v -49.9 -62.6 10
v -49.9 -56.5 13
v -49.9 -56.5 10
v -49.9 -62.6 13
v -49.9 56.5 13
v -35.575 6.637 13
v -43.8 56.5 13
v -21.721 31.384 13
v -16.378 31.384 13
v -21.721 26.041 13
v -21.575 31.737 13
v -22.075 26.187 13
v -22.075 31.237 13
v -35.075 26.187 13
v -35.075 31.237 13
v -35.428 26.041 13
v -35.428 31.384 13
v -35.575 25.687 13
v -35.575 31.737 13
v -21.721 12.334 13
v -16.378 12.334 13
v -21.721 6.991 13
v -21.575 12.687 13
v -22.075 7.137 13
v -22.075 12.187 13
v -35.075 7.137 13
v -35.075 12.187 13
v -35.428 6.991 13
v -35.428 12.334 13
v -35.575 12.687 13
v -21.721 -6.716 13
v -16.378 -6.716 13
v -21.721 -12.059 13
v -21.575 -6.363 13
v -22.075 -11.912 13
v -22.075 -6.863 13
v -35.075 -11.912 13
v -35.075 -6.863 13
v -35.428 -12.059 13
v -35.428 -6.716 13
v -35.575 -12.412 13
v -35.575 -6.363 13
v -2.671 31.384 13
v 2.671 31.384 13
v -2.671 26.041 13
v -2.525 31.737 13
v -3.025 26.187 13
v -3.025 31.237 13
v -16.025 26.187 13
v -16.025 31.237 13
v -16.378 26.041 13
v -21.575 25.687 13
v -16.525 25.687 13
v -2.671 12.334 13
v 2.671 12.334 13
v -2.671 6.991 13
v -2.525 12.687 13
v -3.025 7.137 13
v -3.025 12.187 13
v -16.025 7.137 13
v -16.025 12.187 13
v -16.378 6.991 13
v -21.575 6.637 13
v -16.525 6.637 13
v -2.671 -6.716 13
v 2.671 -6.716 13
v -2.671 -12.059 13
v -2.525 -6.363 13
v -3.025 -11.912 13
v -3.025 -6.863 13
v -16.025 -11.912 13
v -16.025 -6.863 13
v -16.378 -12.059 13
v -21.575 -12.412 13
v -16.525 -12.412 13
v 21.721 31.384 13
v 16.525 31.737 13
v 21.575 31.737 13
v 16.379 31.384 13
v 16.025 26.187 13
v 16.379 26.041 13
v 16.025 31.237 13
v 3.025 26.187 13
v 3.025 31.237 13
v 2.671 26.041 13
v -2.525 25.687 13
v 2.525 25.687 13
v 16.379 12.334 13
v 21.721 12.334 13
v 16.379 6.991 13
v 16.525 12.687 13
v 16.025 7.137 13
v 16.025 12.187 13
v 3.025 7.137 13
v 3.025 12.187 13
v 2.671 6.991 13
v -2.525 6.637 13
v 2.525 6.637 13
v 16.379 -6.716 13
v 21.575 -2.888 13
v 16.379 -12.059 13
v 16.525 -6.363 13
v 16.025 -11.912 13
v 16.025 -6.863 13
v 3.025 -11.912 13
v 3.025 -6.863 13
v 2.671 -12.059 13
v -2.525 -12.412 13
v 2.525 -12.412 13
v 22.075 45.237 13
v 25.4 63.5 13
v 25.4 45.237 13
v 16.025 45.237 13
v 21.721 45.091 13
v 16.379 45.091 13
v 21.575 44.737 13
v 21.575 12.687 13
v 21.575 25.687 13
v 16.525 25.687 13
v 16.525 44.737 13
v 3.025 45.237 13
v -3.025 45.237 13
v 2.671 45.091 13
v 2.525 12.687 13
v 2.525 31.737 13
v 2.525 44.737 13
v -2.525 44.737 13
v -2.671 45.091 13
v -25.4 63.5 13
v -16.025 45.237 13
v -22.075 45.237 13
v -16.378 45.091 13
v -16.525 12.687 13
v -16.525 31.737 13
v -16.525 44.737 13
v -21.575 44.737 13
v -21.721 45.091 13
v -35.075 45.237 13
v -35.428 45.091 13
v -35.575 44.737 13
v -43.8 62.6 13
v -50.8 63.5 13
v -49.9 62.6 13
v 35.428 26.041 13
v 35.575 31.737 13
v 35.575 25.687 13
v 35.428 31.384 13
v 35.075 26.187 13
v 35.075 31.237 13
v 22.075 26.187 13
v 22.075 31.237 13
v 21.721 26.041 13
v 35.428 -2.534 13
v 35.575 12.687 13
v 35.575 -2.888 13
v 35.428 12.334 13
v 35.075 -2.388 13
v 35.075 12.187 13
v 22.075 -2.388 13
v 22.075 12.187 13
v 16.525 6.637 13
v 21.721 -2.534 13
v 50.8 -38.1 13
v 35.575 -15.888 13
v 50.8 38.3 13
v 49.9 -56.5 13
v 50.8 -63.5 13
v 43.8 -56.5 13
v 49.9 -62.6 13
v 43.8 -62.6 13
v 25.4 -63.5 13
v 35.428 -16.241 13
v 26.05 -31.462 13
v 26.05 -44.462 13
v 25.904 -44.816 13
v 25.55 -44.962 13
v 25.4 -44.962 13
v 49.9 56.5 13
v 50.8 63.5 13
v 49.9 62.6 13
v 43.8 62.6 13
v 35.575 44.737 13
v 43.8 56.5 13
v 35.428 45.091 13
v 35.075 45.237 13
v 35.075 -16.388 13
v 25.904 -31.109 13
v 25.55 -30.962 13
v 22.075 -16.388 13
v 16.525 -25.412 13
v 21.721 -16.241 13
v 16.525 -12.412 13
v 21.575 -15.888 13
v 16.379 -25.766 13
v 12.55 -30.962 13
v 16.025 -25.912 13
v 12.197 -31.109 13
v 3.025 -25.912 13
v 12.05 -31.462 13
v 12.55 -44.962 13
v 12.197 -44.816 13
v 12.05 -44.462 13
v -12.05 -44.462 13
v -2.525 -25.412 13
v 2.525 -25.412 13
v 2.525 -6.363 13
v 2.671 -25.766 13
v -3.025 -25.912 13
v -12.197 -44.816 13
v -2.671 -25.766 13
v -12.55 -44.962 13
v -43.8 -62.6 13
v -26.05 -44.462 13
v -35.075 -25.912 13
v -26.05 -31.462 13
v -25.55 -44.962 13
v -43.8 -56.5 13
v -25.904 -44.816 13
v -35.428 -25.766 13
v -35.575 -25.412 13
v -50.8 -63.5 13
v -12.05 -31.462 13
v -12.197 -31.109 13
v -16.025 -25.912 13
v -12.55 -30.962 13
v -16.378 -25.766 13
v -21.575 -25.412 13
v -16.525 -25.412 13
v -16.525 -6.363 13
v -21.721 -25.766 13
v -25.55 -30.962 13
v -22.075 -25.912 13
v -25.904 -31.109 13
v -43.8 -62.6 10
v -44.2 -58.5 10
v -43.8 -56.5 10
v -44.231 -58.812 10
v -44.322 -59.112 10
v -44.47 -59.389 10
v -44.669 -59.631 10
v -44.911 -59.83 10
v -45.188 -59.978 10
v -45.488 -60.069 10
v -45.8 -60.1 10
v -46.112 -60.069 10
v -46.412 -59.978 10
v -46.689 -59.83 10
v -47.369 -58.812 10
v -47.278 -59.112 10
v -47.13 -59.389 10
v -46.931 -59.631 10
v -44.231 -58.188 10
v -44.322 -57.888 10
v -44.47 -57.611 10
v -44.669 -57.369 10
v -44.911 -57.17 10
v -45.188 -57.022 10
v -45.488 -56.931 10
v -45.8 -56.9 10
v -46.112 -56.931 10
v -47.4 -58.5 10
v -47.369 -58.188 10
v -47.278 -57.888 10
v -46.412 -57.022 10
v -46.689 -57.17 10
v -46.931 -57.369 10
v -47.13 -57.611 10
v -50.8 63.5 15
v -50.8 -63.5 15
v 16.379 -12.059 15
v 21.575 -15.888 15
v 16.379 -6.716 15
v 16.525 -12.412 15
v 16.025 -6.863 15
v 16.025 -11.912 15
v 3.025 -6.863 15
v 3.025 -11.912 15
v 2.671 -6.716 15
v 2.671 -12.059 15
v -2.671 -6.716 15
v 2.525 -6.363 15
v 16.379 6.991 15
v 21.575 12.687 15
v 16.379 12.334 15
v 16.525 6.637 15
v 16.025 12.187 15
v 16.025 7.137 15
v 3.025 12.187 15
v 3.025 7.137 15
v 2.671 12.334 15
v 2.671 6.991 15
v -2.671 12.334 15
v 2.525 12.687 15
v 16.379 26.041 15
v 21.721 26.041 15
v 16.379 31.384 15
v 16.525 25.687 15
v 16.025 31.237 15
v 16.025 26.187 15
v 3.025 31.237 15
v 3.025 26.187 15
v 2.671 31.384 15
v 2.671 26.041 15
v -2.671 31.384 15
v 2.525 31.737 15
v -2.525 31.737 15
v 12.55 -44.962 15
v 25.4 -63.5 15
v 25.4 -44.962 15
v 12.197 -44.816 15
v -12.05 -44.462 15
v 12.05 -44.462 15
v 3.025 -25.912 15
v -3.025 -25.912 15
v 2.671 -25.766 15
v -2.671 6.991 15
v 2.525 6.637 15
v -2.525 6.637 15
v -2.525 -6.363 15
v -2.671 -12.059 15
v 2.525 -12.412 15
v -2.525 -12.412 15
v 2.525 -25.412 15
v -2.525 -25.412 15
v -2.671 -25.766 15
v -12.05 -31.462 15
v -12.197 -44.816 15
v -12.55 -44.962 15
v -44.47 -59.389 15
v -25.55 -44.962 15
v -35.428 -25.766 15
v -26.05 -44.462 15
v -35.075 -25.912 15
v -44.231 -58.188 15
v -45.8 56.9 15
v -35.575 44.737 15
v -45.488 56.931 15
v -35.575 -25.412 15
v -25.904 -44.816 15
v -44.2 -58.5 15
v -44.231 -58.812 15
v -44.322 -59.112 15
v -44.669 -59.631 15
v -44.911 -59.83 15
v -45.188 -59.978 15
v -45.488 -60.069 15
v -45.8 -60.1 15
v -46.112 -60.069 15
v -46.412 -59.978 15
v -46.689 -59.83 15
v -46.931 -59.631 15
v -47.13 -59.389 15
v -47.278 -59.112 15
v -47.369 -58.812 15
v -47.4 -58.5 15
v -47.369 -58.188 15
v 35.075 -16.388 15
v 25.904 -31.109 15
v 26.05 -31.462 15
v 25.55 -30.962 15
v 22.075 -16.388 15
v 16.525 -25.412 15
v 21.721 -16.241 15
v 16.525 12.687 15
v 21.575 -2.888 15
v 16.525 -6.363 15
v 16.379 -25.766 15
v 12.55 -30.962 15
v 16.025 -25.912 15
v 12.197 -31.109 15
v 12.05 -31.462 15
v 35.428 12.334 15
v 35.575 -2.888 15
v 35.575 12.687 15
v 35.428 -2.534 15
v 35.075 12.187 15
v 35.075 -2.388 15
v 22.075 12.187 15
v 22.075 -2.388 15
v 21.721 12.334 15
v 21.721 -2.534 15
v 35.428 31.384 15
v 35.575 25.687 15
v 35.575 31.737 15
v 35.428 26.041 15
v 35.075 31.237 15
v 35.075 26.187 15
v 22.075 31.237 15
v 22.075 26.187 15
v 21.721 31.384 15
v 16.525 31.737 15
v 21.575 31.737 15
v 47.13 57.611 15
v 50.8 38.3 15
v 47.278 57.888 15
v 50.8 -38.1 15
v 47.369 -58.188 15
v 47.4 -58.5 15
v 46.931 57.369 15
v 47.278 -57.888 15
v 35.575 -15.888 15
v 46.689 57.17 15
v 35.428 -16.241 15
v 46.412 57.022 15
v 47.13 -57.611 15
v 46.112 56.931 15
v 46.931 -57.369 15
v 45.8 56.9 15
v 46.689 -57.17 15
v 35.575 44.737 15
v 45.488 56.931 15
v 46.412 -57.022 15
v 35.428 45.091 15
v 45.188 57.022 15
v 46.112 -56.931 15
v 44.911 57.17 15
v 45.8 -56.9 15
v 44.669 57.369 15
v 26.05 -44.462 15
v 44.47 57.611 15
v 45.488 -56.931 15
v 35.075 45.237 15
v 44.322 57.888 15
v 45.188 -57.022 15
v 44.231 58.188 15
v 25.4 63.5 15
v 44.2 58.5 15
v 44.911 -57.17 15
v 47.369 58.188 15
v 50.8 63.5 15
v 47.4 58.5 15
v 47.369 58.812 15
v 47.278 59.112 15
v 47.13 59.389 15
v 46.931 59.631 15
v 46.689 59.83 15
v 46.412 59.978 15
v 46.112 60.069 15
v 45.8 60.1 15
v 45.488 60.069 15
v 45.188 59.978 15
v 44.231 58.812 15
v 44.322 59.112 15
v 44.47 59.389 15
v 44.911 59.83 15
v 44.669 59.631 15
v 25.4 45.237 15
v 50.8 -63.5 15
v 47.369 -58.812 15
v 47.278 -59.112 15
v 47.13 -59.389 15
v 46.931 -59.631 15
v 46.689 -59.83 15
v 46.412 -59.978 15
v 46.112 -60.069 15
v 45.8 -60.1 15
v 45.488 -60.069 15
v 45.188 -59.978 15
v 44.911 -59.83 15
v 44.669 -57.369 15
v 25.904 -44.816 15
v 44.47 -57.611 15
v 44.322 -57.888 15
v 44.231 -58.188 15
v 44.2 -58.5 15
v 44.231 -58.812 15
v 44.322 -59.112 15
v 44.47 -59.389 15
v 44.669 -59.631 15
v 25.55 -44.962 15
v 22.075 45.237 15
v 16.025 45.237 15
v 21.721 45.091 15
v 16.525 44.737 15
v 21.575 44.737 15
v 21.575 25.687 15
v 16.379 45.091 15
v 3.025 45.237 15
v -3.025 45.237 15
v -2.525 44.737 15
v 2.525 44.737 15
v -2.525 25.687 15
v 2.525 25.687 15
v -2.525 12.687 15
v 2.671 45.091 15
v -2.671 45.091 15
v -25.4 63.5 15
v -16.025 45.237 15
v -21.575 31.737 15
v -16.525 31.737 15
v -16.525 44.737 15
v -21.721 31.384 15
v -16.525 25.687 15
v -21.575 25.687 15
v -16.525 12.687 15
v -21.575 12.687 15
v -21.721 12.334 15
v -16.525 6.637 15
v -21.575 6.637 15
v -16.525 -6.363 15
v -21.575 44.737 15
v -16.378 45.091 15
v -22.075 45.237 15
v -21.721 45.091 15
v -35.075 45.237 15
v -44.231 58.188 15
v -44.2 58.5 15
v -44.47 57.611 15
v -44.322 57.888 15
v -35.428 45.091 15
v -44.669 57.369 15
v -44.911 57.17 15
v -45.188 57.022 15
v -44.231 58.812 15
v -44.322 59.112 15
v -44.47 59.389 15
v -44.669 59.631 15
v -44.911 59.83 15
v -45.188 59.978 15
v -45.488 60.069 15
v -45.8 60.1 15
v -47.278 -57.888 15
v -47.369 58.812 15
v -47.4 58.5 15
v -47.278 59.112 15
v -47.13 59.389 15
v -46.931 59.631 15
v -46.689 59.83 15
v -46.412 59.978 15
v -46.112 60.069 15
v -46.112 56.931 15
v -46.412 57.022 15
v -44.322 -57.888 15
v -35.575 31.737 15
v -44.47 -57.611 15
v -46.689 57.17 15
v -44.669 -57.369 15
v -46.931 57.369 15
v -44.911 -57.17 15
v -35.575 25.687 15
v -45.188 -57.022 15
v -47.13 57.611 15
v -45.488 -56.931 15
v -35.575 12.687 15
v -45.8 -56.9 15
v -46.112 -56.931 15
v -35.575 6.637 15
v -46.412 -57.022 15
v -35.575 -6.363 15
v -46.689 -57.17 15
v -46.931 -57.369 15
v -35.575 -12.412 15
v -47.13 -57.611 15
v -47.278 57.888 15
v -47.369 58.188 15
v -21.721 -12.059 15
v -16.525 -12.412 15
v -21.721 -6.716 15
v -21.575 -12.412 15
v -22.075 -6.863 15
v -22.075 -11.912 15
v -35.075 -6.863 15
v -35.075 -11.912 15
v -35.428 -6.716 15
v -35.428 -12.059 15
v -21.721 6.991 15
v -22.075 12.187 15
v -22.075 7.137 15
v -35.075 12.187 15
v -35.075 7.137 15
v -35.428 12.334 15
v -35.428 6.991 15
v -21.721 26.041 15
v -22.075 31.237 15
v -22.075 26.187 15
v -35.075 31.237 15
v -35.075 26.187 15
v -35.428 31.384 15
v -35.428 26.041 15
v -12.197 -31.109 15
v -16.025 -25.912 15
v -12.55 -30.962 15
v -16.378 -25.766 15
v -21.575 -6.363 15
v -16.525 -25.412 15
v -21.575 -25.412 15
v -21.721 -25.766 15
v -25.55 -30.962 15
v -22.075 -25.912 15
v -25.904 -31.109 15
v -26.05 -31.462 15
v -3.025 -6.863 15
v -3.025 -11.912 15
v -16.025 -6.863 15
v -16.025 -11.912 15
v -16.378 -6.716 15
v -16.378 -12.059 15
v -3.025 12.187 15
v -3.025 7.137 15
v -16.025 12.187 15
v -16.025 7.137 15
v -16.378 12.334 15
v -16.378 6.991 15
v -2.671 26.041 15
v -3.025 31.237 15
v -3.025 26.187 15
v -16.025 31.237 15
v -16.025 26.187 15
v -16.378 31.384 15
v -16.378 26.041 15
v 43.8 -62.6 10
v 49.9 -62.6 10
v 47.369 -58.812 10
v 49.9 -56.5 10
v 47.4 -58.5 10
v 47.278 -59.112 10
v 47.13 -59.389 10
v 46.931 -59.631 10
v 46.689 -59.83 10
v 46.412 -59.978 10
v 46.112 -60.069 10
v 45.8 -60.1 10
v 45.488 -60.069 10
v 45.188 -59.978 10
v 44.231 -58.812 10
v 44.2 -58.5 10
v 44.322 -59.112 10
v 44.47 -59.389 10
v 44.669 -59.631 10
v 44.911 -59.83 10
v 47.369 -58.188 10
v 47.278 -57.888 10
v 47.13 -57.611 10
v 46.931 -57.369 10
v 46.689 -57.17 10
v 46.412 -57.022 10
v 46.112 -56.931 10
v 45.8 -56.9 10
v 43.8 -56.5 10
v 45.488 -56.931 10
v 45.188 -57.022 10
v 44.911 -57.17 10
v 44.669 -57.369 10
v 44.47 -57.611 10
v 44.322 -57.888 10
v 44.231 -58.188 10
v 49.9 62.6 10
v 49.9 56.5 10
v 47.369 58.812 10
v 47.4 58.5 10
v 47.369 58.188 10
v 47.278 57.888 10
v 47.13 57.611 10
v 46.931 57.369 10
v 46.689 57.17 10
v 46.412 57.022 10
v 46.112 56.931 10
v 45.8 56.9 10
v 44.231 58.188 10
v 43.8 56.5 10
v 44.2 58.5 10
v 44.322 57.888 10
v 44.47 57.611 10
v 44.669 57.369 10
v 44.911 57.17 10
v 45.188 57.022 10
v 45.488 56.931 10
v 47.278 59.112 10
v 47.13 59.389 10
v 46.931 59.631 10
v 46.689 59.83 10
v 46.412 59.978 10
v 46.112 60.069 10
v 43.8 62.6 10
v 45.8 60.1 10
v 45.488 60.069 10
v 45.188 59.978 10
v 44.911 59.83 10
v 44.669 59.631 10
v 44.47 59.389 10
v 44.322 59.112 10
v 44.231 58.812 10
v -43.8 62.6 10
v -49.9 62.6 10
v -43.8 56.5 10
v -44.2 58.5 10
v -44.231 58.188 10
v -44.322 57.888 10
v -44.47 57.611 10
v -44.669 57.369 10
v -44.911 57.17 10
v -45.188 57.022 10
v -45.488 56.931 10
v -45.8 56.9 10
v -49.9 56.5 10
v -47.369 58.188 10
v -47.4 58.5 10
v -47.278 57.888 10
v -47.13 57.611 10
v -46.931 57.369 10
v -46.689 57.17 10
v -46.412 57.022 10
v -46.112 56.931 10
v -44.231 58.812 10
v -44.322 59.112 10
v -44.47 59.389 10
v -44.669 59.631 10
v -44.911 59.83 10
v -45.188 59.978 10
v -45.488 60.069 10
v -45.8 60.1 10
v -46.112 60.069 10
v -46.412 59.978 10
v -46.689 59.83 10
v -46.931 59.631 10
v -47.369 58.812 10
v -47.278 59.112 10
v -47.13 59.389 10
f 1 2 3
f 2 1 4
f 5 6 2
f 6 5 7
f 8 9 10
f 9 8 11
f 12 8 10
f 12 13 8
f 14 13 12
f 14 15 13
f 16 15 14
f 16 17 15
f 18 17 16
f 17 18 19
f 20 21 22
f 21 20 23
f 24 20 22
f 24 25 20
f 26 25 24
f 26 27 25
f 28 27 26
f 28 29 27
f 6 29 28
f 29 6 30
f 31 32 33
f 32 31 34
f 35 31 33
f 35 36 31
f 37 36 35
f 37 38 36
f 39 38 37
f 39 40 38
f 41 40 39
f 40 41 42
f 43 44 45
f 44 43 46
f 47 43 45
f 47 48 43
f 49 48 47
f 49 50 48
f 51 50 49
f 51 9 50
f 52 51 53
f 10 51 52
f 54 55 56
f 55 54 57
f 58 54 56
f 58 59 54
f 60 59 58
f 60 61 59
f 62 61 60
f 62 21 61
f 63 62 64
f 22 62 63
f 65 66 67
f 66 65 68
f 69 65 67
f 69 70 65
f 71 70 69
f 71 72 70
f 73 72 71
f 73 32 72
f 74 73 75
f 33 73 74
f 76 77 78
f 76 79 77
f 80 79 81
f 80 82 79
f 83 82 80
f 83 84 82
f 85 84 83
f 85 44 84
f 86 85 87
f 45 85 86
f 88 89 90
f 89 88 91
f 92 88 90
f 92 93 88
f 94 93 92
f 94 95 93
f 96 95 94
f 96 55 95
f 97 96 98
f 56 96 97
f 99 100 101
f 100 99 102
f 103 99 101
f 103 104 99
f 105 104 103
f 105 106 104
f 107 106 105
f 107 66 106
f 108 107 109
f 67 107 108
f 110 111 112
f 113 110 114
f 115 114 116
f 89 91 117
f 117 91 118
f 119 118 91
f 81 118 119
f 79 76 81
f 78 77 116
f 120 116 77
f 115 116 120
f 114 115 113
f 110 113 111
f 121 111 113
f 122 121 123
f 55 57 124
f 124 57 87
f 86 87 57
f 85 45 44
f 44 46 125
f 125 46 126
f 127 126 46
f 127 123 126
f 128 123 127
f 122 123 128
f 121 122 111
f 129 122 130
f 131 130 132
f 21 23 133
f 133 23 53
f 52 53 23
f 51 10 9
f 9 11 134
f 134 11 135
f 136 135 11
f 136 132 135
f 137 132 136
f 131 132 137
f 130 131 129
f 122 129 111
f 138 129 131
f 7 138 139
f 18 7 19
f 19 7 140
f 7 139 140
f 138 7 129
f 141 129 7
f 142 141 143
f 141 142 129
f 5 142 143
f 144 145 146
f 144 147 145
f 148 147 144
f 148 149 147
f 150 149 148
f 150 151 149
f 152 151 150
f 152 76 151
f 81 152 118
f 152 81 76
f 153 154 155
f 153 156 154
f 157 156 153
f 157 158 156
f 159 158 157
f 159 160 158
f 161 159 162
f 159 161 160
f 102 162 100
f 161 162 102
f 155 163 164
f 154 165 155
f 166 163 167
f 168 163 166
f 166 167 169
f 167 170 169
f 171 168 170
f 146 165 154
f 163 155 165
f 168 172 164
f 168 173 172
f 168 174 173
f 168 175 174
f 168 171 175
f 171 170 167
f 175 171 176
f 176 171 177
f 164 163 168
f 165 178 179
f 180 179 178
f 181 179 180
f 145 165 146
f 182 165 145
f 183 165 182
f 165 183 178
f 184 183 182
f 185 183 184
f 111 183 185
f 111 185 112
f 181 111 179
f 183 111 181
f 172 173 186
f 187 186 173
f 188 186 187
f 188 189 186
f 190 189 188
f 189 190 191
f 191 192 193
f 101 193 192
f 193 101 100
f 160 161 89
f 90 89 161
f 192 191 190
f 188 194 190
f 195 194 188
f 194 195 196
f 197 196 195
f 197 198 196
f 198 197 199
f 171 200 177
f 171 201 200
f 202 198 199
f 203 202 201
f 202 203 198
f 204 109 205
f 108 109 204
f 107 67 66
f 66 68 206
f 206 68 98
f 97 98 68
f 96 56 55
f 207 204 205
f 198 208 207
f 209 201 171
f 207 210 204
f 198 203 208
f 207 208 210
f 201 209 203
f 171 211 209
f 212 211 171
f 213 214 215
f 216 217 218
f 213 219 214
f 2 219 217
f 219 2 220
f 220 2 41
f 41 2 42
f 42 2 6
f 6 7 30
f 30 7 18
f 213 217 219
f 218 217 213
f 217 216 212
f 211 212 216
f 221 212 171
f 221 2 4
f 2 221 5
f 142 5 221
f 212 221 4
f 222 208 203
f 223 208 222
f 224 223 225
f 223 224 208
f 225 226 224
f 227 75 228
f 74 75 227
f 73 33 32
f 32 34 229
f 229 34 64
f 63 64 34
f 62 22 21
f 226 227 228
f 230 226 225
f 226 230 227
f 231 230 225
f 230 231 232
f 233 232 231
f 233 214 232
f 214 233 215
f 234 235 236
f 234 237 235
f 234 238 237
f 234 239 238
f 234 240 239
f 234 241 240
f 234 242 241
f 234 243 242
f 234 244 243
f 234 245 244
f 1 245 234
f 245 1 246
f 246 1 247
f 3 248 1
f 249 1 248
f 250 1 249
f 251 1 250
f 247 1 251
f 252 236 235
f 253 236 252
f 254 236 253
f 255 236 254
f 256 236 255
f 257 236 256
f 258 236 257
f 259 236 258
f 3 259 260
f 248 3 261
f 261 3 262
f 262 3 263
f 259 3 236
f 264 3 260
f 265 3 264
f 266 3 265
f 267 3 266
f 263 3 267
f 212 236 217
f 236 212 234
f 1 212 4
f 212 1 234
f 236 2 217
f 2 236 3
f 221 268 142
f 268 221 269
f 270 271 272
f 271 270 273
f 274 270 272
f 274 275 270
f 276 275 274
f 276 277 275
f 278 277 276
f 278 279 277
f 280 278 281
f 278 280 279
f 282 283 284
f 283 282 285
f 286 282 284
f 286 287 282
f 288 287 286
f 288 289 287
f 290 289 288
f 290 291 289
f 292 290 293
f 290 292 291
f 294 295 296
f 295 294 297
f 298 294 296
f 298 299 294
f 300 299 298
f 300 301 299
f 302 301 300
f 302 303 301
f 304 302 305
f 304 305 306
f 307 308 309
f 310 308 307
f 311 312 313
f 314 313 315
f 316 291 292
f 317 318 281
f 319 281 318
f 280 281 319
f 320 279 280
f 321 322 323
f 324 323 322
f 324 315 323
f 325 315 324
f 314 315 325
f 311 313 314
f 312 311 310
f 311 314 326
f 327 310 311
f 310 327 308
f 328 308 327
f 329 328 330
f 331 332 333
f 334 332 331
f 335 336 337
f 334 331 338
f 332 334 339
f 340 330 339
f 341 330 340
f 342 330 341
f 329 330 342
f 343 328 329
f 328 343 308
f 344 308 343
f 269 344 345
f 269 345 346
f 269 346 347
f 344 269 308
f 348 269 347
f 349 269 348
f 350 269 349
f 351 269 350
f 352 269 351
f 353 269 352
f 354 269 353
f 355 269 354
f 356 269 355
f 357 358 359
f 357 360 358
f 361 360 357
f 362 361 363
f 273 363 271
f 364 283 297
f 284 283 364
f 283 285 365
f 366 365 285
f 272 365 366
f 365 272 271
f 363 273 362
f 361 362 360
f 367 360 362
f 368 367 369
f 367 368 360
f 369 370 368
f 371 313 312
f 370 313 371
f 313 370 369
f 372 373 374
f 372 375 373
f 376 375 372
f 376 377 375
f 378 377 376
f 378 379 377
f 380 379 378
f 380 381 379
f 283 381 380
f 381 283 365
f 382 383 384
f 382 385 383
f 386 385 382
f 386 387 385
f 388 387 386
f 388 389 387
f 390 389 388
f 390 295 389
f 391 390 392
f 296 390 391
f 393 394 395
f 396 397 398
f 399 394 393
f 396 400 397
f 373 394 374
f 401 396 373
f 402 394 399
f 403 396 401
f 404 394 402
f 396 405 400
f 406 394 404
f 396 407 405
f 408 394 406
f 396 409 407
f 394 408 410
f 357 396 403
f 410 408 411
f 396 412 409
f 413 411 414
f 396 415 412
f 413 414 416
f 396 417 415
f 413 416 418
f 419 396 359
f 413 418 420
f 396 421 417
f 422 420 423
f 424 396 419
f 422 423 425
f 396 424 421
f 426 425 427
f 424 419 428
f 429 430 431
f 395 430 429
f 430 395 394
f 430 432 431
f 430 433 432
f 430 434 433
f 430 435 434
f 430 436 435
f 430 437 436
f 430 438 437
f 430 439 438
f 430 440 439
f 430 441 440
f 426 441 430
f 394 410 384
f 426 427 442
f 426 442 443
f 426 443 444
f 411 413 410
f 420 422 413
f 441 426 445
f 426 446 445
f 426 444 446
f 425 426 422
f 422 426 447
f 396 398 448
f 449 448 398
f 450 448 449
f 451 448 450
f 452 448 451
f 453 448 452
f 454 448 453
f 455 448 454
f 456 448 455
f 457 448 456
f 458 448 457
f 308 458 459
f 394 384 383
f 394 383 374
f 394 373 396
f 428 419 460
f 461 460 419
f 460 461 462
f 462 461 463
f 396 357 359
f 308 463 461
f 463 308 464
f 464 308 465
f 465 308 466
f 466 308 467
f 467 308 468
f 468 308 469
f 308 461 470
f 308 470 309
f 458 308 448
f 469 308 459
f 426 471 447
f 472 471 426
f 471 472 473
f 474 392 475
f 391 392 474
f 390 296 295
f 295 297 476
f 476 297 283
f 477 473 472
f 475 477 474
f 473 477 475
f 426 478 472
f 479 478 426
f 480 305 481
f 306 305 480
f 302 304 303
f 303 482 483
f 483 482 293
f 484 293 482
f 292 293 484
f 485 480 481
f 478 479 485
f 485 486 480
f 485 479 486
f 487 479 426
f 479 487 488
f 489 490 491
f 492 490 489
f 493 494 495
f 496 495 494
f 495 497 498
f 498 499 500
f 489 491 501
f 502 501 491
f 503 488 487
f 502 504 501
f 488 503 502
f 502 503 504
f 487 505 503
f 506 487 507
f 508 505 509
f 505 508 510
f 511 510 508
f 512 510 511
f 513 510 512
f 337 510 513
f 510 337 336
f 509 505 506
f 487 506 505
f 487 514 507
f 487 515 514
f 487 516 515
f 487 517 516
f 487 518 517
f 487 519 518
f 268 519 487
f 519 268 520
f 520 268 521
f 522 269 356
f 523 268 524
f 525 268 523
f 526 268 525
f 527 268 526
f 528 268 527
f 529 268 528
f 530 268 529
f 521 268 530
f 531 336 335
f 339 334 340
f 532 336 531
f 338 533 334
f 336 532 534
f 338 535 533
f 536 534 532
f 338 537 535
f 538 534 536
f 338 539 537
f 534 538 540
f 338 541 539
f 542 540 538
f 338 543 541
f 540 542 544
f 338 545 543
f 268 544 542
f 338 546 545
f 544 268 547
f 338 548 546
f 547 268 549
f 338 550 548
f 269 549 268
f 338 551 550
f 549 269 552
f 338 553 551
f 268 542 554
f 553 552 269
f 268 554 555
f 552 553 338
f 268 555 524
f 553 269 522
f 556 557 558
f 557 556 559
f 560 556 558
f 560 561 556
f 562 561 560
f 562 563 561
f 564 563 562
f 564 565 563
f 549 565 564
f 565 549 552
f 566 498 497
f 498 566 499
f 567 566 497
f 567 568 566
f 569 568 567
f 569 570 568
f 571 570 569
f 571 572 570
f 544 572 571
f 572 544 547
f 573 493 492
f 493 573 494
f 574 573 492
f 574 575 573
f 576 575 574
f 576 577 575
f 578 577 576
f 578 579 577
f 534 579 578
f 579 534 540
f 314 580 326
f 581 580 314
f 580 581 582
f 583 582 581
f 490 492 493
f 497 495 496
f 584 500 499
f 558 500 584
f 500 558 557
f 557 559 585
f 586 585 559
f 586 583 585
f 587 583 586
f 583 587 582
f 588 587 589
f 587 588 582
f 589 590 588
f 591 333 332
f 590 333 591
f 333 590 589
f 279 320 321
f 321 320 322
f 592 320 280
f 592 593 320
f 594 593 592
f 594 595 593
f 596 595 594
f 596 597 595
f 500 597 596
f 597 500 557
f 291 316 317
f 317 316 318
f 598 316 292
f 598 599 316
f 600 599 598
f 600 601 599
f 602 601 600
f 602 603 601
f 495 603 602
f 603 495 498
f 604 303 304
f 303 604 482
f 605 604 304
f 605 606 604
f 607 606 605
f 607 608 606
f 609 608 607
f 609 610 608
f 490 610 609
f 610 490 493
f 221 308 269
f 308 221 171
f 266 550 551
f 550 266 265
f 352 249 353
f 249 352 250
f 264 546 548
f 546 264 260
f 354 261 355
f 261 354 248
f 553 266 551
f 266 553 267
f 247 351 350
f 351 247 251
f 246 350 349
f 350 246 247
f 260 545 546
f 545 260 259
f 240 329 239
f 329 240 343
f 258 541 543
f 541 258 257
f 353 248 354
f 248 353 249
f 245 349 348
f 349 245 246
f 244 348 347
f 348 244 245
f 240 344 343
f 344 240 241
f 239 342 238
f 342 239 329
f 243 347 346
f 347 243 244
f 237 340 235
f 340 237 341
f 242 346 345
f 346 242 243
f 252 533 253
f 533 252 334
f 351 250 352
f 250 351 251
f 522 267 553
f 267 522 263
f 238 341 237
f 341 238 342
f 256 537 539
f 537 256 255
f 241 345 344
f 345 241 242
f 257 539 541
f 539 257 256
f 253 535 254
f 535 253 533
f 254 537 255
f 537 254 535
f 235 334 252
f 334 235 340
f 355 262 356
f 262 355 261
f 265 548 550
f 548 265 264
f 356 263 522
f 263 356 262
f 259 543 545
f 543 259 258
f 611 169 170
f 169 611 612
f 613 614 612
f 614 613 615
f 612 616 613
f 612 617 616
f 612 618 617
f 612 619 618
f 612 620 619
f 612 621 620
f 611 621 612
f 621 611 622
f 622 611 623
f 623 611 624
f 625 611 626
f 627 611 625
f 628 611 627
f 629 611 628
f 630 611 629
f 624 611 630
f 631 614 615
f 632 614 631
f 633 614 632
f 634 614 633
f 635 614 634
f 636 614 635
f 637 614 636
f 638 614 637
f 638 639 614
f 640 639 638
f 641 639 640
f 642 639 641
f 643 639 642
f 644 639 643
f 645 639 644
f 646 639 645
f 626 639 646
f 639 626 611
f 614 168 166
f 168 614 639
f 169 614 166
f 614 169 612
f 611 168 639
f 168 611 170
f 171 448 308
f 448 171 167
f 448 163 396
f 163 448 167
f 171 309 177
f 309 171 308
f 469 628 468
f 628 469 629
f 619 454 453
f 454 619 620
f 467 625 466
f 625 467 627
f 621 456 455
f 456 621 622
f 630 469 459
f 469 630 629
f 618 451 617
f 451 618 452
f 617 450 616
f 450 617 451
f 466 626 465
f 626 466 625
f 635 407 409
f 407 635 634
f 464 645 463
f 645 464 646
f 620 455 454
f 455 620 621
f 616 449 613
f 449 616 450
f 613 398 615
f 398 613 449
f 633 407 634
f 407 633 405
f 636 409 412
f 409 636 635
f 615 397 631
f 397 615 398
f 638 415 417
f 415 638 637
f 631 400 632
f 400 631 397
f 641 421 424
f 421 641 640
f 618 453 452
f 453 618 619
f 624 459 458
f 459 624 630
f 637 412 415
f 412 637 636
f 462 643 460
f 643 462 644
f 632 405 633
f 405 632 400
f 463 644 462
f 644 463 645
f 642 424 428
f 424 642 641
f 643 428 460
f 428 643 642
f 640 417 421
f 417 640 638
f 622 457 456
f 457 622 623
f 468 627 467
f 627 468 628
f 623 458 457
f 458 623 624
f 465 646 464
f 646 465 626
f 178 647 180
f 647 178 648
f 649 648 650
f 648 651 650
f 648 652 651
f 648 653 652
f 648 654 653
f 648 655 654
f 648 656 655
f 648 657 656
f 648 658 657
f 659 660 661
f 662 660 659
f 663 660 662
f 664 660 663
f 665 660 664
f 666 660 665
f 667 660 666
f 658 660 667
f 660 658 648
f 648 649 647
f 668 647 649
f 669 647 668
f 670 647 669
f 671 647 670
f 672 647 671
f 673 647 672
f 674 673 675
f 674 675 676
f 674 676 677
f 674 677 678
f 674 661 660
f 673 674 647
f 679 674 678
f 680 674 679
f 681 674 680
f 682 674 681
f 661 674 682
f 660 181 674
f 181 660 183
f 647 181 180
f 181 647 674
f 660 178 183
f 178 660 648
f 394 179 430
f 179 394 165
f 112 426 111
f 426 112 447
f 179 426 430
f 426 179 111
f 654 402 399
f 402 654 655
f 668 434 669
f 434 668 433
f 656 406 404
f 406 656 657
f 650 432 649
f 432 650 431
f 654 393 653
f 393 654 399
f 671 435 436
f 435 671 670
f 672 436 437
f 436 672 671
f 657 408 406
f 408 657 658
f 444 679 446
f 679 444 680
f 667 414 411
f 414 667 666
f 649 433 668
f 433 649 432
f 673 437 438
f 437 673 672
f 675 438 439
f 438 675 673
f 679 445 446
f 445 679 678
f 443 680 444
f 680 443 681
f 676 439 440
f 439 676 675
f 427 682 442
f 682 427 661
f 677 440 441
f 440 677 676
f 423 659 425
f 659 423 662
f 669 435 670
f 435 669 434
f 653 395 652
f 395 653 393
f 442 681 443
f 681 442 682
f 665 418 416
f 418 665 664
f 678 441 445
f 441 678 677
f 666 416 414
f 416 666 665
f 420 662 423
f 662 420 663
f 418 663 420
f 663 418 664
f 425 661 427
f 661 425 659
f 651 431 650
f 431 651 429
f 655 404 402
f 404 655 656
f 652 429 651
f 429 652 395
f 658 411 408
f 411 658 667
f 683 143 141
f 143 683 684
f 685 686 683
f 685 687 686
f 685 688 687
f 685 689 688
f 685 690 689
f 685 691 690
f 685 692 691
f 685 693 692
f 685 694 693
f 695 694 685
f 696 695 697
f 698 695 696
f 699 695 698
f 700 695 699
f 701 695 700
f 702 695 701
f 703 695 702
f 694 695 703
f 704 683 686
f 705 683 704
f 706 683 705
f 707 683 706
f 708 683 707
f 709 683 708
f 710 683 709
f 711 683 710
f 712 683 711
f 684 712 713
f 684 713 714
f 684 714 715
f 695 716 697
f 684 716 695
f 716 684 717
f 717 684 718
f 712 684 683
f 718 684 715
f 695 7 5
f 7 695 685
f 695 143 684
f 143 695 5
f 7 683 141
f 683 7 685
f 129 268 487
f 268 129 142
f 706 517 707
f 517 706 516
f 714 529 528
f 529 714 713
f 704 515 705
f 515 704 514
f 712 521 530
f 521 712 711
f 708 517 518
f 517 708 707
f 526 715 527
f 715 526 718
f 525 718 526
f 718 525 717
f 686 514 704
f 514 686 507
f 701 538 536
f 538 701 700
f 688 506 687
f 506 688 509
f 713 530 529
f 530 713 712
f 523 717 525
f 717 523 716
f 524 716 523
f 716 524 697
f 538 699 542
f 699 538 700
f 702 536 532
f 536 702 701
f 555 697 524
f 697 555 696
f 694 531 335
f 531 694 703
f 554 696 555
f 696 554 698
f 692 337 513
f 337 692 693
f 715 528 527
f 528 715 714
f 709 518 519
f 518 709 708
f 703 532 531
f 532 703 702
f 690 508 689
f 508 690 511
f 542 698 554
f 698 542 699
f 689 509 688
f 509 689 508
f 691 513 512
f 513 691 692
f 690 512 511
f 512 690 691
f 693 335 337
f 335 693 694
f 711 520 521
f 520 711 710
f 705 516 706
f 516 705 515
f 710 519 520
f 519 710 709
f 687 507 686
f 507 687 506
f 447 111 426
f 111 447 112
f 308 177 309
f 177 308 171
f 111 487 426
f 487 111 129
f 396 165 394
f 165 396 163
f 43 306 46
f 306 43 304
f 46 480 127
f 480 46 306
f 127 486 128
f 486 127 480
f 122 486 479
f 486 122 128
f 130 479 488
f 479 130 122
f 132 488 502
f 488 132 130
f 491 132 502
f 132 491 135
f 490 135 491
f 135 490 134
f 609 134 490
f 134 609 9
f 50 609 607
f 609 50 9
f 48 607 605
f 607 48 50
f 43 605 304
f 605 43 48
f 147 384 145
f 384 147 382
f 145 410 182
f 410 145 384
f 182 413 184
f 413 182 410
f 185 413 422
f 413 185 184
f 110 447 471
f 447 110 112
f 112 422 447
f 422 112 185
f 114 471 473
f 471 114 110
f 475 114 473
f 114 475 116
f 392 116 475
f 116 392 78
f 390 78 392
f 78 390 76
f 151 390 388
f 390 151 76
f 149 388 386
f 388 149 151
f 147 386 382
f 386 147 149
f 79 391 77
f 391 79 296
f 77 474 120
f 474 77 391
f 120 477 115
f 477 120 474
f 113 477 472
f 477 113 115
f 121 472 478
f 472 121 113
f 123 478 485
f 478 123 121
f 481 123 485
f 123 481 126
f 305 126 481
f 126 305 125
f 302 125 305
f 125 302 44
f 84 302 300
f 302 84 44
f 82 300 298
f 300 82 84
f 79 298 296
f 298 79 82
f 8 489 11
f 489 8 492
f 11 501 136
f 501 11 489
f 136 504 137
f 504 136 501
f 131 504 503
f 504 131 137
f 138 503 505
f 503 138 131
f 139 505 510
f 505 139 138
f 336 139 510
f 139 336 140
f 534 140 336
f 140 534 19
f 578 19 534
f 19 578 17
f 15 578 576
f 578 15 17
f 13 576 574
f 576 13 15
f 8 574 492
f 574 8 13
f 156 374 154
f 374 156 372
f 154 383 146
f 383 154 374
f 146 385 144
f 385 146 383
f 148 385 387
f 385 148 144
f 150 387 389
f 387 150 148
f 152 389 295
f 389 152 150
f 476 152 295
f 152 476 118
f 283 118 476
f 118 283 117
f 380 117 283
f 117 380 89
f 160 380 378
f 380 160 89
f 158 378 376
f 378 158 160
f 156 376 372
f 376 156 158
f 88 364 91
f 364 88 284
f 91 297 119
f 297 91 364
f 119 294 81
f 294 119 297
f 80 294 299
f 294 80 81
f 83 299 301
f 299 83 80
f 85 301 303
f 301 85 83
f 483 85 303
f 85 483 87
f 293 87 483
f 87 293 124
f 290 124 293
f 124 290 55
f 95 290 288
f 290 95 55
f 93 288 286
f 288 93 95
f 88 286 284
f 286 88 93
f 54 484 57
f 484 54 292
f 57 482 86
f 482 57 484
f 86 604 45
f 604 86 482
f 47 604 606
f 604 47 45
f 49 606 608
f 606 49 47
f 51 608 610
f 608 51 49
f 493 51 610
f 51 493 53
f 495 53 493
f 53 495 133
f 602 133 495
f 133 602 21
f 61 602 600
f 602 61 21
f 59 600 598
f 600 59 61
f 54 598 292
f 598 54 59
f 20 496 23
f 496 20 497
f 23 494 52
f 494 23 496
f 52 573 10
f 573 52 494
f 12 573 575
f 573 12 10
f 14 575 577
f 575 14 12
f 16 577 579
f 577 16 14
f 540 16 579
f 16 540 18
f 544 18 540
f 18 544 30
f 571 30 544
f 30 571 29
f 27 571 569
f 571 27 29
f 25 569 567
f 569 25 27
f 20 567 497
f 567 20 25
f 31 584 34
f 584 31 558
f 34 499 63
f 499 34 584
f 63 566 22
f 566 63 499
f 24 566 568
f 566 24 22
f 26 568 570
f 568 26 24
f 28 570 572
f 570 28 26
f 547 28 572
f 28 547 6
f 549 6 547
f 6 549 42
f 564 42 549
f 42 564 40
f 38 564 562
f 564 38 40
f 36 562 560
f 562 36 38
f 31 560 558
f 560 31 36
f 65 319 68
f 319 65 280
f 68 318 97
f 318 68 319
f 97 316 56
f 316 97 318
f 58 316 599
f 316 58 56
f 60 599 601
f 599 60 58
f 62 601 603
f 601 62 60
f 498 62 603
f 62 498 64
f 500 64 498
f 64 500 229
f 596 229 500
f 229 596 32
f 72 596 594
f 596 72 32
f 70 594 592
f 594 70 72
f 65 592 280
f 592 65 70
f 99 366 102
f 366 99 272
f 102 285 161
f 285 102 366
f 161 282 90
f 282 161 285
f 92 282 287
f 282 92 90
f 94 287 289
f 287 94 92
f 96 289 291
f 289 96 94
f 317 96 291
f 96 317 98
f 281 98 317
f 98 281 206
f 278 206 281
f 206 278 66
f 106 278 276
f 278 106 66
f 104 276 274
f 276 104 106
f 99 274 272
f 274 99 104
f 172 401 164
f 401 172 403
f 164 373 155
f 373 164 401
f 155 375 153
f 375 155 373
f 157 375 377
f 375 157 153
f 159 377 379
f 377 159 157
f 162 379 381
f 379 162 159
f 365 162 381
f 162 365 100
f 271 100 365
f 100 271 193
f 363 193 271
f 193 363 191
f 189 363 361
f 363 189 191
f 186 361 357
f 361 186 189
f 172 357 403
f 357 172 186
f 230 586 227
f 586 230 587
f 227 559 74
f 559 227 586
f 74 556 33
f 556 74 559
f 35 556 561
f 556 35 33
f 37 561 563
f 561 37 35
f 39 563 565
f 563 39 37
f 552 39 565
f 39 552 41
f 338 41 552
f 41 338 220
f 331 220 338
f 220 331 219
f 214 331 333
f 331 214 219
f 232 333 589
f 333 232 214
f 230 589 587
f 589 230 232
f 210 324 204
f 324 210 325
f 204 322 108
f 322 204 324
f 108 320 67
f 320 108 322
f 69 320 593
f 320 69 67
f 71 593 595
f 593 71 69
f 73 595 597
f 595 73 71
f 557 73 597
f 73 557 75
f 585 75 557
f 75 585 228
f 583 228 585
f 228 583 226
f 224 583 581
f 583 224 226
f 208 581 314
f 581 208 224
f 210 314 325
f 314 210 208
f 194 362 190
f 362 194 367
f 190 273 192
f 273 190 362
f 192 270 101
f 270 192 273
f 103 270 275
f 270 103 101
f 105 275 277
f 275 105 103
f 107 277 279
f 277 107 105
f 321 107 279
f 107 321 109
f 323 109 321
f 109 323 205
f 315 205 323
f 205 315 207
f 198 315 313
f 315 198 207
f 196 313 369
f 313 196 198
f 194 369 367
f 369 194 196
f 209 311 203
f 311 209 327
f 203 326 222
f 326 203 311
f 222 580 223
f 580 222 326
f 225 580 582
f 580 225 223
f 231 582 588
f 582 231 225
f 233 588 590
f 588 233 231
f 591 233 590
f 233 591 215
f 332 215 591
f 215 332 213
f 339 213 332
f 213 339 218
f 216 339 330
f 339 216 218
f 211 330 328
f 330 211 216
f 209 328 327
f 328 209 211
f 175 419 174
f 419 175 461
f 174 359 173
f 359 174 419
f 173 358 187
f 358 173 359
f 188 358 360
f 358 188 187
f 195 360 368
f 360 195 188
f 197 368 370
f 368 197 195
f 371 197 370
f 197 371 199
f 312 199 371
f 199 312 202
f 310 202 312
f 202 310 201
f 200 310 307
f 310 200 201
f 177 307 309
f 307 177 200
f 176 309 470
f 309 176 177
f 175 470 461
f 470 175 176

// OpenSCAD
base = 4;
wall_height = 0.9;







module corner_base(){
    cube([25.4,25.4,base],center = false);
    rotate([0,0,270]){
        translate([0,0,0]){
            mirror([1,0,0]){
                difference(){
        union(){
            
            translate([0,25.4-wall_height,base])
                cube([25.4,0.9,9]);
            translate([0,17.4,base])
                    cube([7.1,7.1,4],center = false);
            
            difference(){
                translate([17.4,17.4,base])
                    cube([7.1,7.1,4],center = false);
                translate([20.4,20.4,base+2.5])
                    cylinder(h = 5, r = 1.6,center = true,$fn = 32  );
            }
        }
        translate([25.4/2 - 11/2,25.4-2,base+4])
            cube([11,5,10]);
        translate([3.6,24.9,base+2]){
            rotate([90,0,0])
            cylinder(h=3,r=1.6,center = true,$fn = 32);
    }
        translate([21.8,24.9,base+2]){
            rotate([90,0,0])
                cylinder(h=3,r=1.6,center = true,$fn = 32);
    }
    }   
                
            }
            
    }      
        
    }

    difference(){
        union(){
            
            translate([0,25.4-wall_height,base])
                cube([25.4,0.9,9]);
            translate([0,17.4,base])
                    cube([7.1,7.1,4],center = false);
            
            difference(){
                translate([17.4,17.4,base])
                    cube([7.1,7.1,4],center = false);
                translate([20.4,20.4,base+2.5])
                    cylinder(h = 5, r = 1.6,center = true,$fn = 32  );
            }
        }
        translate([25.4/2 - 11/2,25.4-2,base+4])
            cube([11,5,10]);
        translate([3.6,24.9,base+2]){
            rotate([90,0,0])
            cylinder(h=3,r=1.6,center = true,$fn = 32);
    }
        translate([21.8,24.9,base+2]){
            rotate([90,0,0])
                cylinder(h=3,r=1.6,center = true,$fn = 32);
    }
    }   
}
















module edge_base(){
    translate([-25.4,0,0]){

        cube([25.4,25.4,base],center = false);
        

        difference(){
            union(){
                
                translate([0,25.4-wall_height,base])
                    cube([25.4,0.9,9]);
                translate([0,17.4,base])
                        cube([7.1,7.1,4],center = false);
                
                difference(){
                    translate([17.4,17.4,base])
                        cube([7.1,7.1,4],center = false);
                    
                }
            }
            translate([25.4/2 - 11/2,25.4-2,base+4])
                cube([11,5,10]);
            translate([3.6,24.9,base+2]){
                rotate([90,0,0])
                cylinder(h=3,r=1.6,center = true,$fn = 32);
        }
            translate([21.8,24.9,base+2]){
                rotate([90,0,0])
                    cylinder(h=3,r=1.6,center = true,$fn = 32);
        }
        }
    }

}








module corner_top(){
    difference(){
        union(){
            translate([18.4,18.4,10]){
                cube([6.1,6.1,3]);
            }
            translate([0,0,9+base]){
                cube([25.4,25.4,2]);
            }
        }
        
        
        translate([20.4,20.4,12.5])
            cylinder(h = 15, r = 1.6,center = true,$fn = 32  );

    }
}
difference(){
    union(){
        translate([-25.4,-38.1,0]){
            rotate([0,0,180])   
                corner_top();


            translate([50.8,0,0])
                rotate([0,0,270])   
                    corner_top();


            translate([50.8,76.2,0])
                rotate([0,0,0])   
                    corner_top();
             
            translate([0,-25.4,9+base]){
                cube([50.8,127,2]);
                
            }
            translate([0,76.2,0])
                rotate([0,0,90])   
                    corner_top();



            translate([-25.4,0,9+base]){
                cube([101.6,76.4,2]);
            }
        }
    }
    linear_extrude(20)
        translate([-38.1,-47.7625])
            difference(){
                translate([1,1])
                    square([74.2,93.525]);
                translate([0,95.525])
                    import("plate.dxf");
                
            }
        }
